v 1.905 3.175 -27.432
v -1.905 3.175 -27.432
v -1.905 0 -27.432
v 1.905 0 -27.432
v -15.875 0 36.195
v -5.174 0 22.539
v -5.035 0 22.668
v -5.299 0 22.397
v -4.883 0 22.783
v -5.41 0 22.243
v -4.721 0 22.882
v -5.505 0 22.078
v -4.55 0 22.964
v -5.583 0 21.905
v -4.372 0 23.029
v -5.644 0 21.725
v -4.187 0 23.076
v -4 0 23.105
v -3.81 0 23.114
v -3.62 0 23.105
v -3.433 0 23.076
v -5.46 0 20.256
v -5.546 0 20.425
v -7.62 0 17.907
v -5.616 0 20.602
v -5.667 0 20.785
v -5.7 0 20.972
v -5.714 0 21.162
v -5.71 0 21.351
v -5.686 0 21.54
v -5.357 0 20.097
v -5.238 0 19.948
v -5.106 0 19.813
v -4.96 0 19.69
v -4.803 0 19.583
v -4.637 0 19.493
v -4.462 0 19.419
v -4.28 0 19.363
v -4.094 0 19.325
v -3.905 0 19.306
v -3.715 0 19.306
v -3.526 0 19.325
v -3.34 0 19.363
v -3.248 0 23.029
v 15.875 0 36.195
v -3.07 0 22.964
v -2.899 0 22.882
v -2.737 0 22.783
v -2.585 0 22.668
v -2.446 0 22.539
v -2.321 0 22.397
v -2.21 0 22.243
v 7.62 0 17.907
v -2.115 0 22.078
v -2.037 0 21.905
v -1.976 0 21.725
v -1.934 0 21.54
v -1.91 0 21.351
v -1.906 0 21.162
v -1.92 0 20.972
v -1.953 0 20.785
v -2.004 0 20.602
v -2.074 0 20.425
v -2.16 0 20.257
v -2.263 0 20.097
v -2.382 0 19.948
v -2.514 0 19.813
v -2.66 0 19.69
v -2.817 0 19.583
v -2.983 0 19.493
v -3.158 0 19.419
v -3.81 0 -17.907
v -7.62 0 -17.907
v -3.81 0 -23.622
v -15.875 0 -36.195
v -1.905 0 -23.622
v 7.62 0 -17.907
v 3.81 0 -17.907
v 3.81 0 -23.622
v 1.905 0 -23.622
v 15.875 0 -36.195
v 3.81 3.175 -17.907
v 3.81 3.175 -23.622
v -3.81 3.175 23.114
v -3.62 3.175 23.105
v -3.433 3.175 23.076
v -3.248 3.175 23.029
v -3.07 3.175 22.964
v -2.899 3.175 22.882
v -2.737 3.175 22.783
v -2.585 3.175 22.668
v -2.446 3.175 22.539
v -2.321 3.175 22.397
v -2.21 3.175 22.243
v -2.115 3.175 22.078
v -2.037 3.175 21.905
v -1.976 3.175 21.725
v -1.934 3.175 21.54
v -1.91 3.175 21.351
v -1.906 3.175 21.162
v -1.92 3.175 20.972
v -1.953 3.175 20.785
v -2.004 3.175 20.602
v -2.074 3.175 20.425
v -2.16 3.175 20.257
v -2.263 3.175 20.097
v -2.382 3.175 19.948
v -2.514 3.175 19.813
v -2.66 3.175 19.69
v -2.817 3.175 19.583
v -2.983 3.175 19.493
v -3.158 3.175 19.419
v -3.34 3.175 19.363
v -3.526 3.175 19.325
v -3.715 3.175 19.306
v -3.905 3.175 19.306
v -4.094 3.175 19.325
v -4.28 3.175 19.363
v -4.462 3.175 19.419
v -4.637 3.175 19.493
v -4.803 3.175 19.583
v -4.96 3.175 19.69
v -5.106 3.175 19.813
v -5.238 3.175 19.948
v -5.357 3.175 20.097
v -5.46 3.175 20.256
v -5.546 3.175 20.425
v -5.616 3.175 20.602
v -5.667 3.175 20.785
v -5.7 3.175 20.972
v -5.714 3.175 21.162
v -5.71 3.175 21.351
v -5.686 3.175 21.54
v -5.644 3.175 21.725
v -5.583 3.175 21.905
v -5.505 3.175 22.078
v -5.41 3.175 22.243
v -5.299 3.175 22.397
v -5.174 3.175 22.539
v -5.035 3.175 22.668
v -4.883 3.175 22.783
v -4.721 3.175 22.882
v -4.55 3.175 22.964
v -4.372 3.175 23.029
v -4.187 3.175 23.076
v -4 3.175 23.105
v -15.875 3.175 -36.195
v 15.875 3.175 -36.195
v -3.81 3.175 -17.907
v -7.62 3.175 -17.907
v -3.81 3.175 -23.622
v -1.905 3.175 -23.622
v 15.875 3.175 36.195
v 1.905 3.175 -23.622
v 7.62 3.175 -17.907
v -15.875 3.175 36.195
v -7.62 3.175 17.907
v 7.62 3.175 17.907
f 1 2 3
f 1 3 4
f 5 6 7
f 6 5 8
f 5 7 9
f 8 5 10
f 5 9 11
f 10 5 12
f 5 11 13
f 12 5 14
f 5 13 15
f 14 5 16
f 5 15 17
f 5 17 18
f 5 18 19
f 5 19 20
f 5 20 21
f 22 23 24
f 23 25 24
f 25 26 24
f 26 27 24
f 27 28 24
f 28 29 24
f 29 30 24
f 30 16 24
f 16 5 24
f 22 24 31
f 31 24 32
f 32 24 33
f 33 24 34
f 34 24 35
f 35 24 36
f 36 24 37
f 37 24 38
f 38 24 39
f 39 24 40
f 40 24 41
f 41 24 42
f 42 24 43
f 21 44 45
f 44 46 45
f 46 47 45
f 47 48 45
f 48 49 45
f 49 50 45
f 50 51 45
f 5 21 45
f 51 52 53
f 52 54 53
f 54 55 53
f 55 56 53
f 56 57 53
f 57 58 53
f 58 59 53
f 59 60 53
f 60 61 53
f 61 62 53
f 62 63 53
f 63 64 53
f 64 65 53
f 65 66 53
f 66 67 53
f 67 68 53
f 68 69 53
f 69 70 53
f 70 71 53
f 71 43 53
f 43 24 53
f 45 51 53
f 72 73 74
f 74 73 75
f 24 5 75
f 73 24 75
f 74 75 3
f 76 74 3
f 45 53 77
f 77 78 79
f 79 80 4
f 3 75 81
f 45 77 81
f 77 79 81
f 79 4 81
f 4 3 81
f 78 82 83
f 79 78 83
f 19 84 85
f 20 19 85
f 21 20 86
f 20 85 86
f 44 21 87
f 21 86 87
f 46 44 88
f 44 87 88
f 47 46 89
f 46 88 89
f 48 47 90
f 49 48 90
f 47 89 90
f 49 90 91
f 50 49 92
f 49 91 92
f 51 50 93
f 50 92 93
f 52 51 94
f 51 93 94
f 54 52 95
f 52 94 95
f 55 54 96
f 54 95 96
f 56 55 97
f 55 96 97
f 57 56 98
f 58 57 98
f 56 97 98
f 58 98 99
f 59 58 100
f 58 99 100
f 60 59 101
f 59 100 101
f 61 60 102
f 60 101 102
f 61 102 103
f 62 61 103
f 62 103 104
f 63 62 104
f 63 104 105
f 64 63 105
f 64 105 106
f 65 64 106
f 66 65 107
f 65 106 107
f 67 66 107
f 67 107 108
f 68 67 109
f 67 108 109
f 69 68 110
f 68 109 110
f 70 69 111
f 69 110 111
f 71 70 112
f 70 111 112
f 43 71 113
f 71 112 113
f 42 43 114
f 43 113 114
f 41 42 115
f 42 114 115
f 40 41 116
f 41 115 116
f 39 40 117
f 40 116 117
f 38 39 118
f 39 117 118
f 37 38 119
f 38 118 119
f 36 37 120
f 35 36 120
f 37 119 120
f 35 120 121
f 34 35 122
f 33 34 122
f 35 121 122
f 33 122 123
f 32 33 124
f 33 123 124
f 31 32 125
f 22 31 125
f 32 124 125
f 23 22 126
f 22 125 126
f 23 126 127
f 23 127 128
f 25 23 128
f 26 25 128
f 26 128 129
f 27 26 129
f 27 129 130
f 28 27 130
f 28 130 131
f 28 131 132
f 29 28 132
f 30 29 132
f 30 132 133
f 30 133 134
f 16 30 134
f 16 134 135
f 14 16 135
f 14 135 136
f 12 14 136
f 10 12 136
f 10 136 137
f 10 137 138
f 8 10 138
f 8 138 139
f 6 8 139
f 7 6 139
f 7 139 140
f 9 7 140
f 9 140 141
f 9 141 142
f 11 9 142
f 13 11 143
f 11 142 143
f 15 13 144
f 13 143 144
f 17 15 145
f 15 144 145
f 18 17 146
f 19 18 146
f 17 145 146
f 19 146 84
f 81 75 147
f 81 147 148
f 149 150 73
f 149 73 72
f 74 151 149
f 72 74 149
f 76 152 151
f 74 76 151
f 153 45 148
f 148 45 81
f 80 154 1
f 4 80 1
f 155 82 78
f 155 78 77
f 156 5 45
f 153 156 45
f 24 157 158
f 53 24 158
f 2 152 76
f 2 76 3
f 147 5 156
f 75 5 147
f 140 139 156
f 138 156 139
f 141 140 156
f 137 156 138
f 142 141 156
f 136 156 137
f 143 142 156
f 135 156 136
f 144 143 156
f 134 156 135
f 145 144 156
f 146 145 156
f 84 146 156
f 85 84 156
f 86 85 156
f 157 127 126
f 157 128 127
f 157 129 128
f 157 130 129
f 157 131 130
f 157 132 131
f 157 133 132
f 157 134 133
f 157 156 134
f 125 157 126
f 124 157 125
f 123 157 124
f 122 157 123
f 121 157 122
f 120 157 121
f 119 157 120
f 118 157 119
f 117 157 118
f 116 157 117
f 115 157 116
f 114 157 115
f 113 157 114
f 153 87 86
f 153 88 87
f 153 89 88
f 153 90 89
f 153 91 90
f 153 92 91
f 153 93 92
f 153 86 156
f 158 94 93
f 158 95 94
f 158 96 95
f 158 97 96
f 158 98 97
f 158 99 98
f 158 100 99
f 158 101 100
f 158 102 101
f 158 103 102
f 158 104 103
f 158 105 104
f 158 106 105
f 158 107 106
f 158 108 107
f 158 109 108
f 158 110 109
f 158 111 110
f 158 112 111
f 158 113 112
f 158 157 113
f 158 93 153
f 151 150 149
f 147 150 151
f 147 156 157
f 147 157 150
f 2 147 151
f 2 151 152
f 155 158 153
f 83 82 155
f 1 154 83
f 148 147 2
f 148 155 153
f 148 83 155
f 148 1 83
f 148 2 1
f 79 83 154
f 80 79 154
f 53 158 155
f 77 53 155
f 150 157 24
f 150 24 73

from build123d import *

# Parameters (mm, degrees)
SKETCH1_W           = 31.75
SKETCH1_H           = 72.39
BOSS_EXTRUDE1_DEPTH = 3.175
SKETCH3_W           = 15.24
SKETCH3_H           = 35.814
CUT_EXTRUDE1_DEPTH  = 3.175
SKETCH4_W           = 3.81
SKETCH4_H           = 3.81
SKETCH4_R           = 1.905
CUT_EXTRUDE9_DEPTH  = 3.175


with BuildPart() as part:
    # Sketch1 → Boss-Extrude1 (new body)
    with BuildSketch(Plane(origin=(0, 0, 0), x_dir=(1, 0, 0), z_dir=(0, 1, 0))):
        Rectangle(SKETCH1_W, SKETCH1_H)
    extrude(amount=BOSS_EXTRUDE1_DEPTH)

    # Sketch3 → Cut-Extrude1 (cut)
    with BuildSketch(Plane(origin=(0, 3.175, 0), x_dir=(1, 0, 0), z_dir=(0, 1, 0))):
        Rectangle(SKETCH3_W, SKETCH3_H)
    extrude(amount=-CUT_EXTRUDE1_DEPTH, mode=Mode.SUBTRACT)

    # Sketch4 → Cut-Extrude9 (cut)
    with BuildSketch(Plane(origin=(0, 3.175, 0), x_dir=(1, 0, 0), z_dir=(0, 1, 0))):
        Polygon((-3.81, 23.622), (-3.81, 17.907), (3.81, 17.907), (3.81, 23.622), (1.905, 23.622), (-1.905, 23.622), align=None)
        with Locations((0, 25.527)):
            Rectangle(SKETCH4_W, SKETCH4_H)
        with Locations(Location((-3.81, -21.209, 0), (0, 0, 270))):
            Circle(SKETCH4_R)
    extrude(amount=-CUT_EXTRUDE9_DEPTH, mode=Mode.SUBTRACT)


solid = part.part
